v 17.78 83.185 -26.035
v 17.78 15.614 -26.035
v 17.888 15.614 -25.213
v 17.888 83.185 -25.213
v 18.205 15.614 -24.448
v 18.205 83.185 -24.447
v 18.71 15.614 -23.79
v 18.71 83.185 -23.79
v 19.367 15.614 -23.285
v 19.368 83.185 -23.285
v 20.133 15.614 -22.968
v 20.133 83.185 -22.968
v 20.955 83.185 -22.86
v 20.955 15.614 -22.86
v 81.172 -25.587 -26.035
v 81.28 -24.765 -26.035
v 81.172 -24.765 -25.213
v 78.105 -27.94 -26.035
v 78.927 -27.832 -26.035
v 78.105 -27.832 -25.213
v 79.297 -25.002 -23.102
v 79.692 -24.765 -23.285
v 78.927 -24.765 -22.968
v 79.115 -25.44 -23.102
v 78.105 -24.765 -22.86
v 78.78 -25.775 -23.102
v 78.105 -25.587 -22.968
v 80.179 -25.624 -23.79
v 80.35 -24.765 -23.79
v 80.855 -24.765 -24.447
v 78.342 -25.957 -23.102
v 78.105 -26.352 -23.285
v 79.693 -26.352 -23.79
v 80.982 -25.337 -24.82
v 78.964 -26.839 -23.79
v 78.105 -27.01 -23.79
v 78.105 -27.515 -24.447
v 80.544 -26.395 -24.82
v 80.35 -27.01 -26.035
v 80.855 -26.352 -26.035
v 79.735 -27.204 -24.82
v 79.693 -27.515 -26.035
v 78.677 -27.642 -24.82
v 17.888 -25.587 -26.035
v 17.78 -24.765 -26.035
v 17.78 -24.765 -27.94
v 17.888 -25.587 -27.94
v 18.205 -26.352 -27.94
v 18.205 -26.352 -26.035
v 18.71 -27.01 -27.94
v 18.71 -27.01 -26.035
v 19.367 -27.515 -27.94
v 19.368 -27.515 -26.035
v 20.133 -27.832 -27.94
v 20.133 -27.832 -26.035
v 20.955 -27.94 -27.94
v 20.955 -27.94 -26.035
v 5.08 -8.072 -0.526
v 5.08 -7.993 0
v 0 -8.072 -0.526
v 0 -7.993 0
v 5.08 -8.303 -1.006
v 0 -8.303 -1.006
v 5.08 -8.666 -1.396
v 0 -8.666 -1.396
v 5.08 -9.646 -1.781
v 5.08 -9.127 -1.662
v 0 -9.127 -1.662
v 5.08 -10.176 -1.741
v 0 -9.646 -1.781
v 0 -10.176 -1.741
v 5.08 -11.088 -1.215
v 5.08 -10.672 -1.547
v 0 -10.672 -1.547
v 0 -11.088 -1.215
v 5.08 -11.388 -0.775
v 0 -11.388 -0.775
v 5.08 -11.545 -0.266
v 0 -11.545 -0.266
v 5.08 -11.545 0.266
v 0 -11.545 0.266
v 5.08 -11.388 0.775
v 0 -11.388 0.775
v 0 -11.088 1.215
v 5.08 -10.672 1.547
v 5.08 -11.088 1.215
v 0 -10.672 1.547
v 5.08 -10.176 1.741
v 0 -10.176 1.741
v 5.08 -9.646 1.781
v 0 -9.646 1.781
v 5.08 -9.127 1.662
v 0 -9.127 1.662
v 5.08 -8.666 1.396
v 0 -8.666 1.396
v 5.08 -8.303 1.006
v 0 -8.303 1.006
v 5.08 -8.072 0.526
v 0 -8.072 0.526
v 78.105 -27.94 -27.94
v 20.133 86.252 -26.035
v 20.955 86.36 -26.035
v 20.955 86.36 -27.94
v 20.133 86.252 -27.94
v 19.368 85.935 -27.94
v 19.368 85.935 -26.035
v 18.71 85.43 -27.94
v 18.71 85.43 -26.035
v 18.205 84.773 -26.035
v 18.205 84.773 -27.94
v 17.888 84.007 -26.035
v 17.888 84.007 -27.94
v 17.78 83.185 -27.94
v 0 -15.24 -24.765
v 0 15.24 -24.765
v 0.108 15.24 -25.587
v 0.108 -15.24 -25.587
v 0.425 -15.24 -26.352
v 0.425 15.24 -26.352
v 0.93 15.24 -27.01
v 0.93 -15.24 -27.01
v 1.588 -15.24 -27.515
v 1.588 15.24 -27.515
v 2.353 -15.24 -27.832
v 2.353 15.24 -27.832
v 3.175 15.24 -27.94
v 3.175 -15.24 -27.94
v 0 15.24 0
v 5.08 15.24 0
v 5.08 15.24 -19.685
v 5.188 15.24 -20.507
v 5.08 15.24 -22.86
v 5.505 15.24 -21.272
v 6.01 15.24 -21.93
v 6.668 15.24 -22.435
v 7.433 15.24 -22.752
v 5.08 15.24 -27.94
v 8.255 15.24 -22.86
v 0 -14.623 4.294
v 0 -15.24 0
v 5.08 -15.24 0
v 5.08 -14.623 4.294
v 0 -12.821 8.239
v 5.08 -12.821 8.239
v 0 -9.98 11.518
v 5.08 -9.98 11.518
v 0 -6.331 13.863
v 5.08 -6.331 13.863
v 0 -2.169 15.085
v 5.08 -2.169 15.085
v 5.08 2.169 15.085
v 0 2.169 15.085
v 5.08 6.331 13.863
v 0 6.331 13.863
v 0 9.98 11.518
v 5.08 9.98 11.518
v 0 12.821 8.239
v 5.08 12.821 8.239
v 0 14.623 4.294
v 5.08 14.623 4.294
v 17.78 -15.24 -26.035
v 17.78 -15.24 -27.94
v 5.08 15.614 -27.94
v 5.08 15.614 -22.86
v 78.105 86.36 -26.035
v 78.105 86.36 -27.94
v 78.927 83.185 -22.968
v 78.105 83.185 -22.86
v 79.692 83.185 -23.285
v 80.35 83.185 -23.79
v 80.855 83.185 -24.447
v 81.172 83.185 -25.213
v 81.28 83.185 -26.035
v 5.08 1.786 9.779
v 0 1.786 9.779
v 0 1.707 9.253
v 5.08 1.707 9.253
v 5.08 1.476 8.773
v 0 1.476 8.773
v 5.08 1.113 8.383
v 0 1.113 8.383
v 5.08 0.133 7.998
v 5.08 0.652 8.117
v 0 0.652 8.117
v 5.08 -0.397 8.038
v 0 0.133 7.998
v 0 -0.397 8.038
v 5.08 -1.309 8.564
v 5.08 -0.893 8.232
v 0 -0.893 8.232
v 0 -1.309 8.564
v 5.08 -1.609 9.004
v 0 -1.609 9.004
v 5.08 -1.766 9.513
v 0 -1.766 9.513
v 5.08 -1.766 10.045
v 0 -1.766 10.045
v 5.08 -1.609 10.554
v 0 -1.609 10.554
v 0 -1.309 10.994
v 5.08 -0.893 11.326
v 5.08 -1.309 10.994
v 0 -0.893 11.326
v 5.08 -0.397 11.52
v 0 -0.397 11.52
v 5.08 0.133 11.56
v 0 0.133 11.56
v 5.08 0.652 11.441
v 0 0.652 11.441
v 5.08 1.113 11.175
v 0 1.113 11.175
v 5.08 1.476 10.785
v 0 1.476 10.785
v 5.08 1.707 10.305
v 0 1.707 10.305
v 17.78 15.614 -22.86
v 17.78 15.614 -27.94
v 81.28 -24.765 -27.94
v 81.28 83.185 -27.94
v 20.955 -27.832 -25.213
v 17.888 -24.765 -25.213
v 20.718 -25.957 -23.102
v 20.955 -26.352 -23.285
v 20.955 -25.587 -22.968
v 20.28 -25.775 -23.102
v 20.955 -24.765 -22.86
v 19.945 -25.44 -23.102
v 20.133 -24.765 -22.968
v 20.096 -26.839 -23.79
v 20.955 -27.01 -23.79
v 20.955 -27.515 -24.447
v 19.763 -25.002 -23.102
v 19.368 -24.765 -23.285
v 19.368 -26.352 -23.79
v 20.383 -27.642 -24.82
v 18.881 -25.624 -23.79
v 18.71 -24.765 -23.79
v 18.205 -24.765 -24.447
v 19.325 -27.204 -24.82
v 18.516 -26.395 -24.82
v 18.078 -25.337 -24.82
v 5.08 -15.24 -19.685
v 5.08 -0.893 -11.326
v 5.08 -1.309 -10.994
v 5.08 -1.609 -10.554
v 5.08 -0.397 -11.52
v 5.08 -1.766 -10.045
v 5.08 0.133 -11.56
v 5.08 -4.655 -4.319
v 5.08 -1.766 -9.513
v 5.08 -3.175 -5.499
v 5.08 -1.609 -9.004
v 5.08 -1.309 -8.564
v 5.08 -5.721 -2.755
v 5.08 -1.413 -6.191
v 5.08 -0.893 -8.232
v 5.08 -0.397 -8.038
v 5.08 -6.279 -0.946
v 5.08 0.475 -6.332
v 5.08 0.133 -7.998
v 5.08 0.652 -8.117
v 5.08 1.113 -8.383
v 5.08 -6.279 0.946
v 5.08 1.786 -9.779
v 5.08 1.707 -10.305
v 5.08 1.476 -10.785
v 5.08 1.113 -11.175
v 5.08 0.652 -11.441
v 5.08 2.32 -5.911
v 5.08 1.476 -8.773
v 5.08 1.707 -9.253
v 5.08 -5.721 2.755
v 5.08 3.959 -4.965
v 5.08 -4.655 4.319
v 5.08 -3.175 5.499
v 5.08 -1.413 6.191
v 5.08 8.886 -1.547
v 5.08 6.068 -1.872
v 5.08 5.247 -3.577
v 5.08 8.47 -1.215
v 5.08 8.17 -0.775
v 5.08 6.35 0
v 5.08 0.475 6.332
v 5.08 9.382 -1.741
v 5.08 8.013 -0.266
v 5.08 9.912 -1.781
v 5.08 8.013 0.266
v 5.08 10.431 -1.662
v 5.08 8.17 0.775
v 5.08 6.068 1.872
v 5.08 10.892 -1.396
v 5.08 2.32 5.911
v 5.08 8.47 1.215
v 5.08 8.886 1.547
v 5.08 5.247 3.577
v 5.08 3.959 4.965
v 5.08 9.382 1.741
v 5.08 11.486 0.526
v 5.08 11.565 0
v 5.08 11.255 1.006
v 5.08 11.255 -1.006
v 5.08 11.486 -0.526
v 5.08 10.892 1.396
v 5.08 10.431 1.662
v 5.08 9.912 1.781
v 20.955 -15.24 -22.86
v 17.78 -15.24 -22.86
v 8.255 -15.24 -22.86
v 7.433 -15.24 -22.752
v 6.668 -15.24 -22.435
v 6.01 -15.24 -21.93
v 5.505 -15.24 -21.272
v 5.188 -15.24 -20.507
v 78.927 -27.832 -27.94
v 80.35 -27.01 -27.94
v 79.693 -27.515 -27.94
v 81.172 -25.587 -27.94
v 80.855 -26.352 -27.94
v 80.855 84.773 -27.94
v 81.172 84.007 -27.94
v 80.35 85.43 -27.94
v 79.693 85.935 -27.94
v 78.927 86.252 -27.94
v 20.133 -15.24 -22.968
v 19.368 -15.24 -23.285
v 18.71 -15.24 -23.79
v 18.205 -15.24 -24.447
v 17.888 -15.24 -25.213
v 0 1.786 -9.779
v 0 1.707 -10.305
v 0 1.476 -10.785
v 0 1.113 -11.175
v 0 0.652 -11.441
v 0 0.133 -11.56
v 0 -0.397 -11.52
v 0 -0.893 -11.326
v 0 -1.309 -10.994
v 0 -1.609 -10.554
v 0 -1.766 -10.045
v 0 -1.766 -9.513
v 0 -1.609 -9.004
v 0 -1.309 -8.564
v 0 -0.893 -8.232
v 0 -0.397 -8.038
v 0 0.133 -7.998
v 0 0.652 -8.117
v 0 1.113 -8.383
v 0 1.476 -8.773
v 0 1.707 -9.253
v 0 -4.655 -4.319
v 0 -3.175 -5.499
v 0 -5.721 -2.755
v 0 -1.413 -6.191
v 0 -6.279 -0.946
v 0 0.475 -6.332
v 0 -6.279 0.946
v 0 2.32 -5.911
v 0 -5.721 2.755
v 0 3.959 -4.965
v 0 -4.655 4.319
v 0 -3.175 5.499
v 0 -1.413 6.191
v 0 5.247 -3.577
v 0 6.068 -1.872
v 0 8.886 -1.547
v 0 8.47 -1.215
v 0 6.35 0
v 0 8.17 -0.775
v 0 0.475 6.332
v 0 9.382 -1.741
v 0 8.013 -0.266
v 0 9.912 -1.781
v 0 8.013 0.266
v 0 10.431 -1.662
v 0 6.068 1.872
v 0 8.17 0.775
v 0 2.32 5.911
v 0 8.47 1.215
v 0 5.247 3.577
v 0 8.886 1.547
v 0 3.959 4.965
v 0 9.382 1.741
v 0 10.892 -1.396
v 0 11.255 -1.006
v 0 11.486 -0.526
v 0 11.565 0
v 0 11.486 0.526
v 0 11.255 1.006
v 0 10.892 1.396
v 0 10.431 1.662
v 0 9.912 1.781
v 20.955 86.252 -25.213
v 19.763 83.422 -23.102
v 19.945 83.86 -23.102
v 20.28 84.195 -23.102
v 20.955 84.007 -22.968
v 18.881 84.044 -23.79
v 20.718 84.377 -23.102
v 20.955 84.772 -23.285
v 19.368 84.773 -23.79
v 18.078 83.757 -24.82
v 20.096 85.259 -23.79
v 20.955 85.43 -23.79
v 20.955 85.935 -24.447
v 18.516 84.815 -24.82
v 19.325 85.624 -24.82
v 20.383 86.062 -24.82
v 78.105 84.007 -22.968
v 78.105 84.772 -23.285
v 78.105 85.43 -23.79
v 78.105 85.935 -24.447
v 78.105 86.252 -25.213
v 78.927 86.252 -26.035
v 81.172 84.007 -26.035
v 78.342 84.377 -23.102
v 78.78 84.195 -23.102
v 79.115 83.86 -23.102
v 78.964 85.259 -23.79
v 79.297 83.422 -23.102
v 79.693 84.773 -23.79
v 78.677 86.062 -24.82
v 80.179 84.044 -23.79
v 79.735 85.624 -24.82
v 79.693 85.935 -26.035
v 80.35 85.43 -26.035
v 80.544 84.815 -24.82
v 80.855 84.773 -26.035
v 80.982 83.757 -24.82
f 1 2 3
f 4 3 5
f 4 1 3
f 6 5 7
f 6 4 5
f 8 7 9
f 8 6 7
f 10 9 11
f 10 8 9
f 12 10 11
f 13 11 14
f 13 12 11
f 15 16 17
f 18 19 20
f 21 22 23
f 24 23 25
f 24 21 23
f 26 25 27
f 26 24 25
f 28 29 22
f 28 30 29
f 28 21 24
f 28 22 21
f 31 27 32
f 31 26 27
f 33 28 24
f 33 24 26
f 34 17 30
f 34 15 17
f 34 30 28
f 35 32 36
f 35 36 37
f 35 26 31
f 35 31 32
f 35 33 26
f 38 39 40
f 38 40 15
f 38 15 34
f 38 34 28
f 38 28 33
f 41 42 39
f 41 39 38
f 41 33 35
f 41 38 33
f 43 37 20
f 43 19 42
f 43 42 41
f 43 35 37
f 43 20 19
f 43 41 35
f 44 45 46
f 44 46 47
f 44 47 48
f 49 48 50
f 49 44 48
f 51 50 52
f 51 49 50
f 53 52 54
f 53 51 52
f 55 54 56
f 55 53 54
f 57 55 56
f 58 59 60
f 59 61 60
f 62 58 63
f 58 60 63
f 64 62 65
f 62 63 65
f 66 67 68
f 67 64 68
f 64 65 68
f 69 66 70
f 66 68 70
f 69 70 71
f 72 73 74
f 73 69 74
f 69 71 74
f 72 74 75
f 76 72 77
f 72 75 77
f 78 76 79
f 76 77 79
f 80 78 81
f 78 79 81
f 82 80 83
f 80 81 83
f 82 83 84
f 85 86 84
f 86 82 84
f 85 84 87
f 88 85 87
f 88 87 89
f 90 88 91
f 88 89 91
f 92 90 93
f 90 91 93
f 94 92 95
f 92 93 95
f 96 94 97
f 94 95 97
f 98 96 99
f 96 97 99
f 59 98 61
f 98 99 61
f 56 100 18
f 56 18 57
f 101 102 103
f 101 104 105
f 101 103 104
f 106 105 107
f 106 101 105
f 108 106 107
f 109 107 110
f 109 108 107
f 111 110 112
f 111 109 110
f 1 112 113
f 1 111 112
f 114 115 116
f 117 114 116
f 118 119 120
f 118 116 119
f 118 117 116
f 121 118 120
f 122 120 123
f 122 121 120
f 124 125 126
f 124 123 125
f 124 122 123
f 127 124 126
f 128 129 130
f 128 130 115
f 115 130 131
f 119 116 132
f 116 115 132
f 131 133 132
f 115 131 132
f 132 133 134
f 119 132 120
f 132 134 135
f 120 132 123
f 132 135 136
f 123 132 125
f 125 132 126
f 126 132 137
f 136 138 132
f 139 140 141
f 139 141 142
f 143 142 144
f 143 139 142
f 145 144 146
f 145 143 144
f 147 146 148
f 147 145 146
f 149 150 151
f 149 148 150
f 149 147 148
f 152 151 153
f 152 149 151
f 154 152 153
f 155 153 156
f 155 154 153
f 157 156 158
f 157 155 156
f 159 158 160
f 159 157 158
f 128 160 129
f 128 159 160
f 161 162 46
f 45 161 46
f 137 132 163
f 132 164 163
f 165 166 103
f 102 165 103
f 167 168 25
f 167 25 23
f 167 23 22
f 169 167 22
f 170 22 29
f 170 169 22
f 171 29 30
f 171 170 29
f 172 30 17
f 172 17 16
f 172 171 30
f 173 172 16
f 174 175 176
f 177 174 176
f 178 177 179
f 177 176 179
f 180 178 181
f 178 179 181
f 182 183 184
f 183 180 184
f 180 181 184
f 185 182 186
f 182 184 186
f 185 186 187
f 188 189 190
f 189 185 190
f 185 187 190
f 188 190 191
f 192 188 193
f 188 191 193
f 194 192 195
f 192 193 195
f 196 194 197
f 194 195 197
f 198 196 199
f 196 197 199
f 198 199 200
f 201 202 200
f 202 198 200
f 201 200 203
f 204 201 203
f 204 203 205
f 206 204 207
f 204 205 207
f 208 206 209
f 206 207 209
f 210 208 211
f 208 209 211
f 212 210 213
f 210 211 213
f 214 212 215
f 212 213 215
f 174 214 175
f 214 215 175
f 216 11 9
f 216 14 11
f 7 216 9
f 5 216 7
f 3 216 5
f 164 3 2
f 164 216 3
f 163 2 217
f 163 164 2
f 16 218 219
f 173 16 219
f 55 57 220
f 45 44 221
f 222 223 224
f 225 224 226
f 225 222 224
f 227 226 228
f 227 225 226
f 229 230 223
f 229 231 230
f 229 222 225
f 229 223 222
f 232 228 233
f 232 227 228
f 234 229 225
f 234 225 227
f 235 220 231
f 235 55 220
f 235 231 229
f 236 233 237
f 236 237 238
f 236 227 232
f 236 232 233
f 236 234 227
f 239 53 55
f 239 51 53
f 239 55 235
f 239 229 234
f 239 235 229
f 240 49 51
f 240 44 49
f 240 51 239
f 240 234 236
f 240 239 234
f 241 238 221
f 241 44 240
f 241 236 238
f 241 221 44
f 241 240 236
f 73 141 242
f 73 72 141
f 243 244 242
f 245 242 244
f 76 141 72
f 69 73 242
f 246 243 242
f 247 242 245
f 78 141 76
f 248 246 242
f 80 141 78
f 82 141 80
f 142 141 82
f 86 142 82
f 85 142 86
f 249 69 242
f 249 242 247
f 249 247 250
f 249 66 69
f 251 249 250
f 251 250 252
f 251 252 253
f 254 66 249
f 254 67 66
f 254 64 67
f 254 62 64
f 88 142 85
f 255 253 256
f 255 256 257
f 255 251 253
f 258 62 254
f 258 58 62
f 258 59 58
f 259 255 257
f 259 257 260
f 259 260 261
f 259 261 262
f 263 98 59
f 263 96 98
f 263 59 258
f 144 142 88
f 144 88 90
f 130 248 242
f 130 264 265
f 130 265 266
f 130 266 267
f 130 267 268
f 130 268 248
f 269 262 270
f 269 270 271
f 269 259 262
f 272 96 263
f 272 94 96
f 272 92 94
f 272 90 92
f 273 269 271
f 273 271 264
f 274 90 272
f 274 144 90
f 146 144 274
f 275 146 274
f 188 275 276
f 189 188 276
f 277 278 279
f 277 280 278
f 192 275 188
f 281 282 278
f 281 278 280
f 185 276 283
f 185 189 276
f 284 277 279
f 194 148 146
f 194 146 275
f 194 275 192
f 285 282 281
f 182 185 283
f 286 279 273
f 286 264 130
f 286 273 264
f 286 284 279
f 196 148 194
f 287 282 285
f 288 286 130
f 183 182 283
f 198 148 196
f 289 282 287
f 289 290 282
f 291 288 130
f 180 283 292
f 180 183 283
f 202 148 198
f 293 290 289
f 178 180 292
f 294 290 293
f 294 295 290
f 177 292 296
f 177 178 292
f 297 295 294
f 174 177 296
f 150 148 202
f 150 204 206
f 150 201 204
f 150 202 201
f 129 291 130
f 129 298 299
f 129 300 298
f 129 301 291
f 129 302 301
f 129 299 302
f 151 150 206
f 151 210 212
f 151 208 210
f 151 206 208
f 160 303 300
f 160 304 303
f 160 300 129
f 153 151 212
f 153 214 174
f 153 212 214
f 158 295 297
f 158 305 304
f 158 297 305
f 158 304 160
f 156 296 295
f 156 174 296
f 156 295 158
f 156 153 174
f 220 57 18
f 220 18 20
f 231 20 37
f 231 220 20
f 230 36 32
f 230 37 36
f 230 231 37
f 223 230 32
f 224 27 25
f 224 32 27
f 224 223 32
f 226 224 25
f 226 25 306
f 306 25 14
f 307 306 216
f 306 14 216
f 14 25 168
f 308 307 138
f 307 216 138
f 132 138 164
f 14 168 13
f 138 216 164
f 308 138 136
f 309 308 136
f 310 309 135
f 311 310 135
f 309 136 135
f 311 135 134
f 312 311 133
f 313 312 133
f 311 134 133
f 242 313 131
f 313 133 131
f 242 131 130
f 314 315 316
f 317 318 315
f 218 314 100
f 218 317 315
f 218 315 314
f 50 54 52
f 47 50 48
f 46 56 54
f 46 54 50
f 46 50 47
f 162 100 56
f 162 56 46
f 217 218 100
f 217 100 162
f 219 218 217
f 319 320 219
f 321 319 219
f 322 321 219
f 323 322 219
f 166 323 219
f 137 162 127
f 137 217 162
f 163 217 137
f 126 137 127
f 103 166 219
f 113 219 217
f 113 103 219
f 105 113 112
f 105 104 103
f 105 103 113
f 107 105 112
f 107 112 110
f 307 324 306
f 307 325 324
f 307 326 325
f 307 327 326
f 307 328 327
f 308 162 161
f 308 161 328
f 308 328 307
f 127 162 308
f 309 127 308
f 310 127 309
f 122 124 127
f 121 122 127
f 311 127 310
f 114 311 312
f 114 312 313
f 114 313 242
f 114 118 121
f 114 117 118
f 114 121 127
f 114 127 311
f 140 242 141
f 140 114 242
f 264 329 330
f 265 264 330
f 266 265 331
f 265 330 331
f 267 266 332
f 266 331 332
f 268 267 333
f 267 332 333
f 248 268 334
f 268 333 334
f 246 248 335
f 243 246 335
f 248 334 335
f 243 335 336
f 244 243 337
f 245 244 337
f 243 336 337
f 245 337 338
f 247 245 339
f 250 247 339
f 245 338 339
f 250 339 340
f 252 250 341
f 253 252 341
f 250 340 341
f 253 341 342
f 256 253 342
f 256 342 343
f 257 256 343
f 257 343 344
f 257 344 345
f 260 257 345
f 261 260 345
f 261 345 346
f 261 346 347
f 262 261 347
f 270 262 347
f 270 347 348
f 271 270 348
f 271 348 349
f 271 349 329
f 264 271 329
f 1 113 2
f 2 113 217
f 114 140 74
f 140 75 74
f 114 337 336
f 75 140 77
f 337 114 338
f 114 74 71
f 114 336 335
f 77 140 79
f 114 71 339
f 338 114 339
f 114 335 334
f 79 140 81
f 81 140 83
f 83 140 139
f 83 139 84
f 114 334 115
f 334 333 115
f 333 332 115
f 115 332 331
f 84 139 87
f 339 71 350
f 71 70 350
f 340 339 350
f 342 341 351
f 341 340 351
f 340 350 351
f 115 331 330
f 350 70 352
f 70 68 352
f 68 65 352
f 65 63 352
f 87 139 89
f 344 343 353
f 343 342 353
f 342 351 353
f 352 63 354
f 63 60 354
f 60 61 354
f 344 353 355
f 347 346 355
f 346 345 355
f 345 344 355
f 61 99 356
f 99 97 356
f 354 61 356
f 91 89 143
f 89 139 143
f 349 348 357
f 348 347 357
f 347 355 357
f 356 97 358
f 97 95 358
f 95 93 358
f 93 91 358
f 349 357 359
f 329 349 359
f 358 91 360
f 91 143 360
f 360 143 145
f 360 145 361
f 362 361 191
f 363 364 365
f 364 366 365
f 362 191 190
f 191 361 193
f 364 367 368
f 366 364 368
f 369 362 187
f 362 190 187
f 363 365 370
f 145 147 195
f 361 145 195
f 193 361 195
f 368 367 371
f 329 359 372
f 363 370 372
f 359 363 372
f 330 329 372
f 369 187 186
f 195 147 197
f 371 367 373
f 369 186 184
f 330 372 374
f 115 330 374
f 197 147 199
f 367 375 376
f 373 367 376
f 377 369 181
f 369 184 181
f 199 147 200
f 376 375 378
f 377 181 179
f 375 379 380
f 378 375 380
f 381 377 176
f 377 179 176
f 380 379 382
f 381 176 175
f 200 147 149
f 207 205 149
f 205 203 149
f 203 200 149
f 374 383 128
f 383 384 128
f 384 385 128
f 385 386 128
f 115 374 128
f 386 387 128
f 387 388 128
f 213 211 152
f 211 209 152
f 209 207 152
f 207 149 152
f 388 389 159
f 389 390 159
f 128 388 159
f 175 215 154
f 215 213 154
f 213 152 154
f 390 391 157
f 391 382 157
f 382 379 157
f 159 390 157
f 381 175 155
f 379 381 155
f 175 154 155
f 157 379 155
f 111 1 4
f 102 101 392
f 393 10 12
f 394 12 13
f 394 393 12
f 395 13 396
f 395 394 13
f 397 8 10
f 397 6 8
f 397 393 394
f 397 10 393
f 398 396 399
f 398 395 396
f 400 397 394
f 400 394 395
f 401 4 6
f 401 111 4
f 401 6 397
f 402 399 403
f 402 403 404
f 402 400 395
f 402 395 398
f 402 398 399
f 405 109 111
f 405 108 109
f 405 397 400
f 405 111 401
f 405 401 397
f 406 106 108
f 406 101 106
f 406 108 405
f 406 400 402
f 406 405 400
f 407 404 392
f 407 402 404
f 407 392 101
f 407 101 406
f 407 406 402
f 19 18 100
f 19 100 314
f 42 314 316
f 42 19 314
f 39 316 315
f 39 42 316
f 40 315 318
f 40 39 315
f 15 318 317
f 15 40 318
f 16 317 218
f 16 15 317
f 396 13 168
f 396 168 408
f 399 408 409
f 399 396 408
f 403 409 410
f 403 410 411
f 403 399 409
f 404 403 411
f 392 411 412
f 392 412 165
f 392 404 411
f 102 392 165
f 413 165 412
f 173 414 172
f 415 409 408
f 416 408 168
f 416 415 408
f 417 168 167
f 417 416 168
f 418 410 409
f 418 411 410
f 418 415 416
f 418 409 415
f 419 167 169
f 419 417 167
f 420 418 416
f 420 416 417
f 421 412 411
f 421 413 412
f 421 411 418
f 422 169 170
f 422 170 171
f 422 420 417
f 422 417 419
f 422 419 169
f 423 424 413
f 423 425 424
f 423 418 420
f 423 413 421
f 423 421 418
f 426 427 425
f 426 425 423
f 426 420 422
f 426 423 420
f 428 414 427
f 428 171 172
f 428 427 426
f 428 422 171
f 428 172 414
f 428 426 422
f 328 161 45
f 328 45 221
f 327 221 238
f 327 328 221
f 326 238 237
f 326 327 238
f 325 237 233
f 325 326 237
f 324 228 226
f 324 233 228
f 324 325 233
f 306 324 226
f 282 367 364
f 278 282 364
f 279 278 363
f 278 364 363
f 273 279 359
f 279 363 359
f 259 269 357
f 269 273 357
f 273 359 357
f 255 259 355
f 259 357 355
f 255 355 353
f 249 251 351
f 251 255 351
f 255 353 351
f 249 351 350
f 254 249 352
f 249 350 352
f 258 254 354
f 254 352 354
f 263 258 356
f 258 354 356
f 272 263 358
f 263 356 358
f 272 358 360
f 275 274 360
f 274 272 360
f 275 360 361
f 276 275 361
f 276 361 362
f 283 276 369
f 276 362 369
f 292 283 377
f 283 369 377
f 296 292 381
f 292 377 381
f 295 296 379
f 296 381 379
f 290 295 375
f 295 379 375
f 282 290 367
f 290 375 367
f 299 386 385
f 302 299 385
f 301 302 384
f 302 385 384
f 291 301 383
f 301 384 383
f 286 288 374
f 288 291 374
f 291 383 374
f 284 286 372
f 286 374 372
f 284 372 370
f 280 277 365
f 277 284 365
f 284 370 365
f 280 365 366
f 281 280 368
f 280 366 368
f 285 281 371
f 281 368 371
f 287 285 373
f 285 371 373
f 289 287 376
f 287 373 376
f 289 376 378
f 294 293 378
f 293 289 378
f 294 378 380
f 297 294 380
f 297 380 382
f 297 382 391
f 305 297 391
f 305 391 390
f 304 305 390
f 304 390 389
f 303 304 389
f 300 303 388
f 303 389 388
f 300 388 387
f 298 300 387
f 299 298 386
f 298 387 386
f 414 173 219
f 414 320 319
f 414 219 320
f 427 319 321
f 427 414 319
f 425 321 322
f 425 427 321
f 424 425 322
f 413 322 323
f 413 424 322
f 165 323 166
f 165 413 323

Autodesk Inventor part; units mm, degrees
ref_plane "YZ Plane" through (0, 0, 0) normal (1, 0, 0) x (0, 1, 0)
ref_plane "XZ Plane" through (0, 0, 0) normal (0, 1, 0) x (-1, 0, 0)
ref_plane "XY Plane" through (0, 0, 0) normal (0, 0, 1) x (1, 0, 0)
sketch "Sketch1" plane through (0, 0, 0) normal (1, 0, 0) x (0, 1, 0)
  circle A0 centre (0, 0) radius 15.24
  circle A1 centre (9.779, 0) radius 1.7859
  circle A2 centre (0, -9.779) radius 1.7859
  circle A3 centre (-9.779, 0) radius 1.7859
  circle A4 centre (0, 9.779) radius 1.7859
  circle A5 centre (0, 0) radius 6.35
  arc A6 (-1.7785, -9.6159) -> (1.7785, -9.6159) centre (0, 0) ccw
  dimension "d0" = 30.48
  dimension "d2" = 3.5719
  dimension "d3" = 3.5719
  dimension "d4" = 3.5719
  dimension "d5" = 3.5719
  dimension "d6" = 12.7
extrude "Extrusion1" add sketch "Sketch1" along normal blind 5.08
sketch "Sketch5" plane through (5.08, 0, 0) normal (1, 0, 0) x (0, 0, -1)
  circle A0 centre (0, 0) radius 15.24 projected
  arc A1 (0, -15.24) -> (0, 15.24) centre (0, 0) ccw
  line L0 (0, 15.24) -> (27.94, 15.24)
  line L1 (27.94, 15.24) -> (27.94, -15.24)
  line L2 (27.94, -15.24) -> (0, -15.24)
  dimension "d17" = 27.94
  dimension "d18" = 30.48
extrude "Extrusion3" add sketch "Sketch5" against normal blind 5.08 contours A0 L0 L1 L2
sketch "Sketch6" plane through (5.08, 0, 0) normal (1, 0, 0) x (0, 0, -1)
  line L0 (27.94, -15.24) -> (27.94, 15.24) projected
  line L1 (27.94, -15.24) -> (22.86, -15.24)
  line L2 (22.86, -15.24) -> (22.86, 15.6141)
  line L3 (22.86, 15.6141) -> (27.94, 15.6141)
  line L4 (27.94, 15.6141) -> (27.94, -15.24)
  point P0 (0, 0)
  dimension "d21" = 5.08
extrude "Extrusion4" add sketch "Sketch6" along normal blind 12.7
sketch "Sketch7" plane through (0, -15.24, -27.94) normal (0, 0, -1) x (-1, 0, 0)
  line L0 (-17.78, 30.8541) -> (-17.78, 0) projected
  line L1 (-17.78, 0) -> (-81.28, 0)
  line L2 (-81.28, 0) -> (-81.28, 101.6)
  line L3 (-81.28, 101.6) -> (-17.78, 101.6)
  line L4 (-17.78, 101.6) -> (-17.78, 0)
  line L5 (-5.08, 0) -> (-17.78, 0) projected
  line L6 (-17.78, 0) -> (-81.28, 0)
  line L7 (-81.28, 0) -> (-81.28, -12.7)
  line L8 (-81.28, -12.7) -> (-17.78, -12.7)
  line L9 (-17.78, -12.7) -> (-17.78, 0)
  point P0 (0, 15.24)
  dimension "d24" = 63.5
  dimension "d25" = 101.6
  dimension "d26" = 12.7
extrude "Extrusion5" add sketch "Sketch7" against normal blind 5.08
fillet "Fillet1" radius 3.175 11 edges at (5.08, 0, -22.86) (17.78, 86.36, -25.4) (81.28, 86.36, -25.4) (81.28, -27.94, -25.4) (0, 0, -27.94) (17.78, -27.94, -25.4) (49.53, -27.94, -22.86) (17.78, -21.59, -22.86) (17.78, 50.987, -22.86) (49.53, 86.36, -22.86) (81.28, 29.21, -22.86)
properties part number "GripperConstant"
